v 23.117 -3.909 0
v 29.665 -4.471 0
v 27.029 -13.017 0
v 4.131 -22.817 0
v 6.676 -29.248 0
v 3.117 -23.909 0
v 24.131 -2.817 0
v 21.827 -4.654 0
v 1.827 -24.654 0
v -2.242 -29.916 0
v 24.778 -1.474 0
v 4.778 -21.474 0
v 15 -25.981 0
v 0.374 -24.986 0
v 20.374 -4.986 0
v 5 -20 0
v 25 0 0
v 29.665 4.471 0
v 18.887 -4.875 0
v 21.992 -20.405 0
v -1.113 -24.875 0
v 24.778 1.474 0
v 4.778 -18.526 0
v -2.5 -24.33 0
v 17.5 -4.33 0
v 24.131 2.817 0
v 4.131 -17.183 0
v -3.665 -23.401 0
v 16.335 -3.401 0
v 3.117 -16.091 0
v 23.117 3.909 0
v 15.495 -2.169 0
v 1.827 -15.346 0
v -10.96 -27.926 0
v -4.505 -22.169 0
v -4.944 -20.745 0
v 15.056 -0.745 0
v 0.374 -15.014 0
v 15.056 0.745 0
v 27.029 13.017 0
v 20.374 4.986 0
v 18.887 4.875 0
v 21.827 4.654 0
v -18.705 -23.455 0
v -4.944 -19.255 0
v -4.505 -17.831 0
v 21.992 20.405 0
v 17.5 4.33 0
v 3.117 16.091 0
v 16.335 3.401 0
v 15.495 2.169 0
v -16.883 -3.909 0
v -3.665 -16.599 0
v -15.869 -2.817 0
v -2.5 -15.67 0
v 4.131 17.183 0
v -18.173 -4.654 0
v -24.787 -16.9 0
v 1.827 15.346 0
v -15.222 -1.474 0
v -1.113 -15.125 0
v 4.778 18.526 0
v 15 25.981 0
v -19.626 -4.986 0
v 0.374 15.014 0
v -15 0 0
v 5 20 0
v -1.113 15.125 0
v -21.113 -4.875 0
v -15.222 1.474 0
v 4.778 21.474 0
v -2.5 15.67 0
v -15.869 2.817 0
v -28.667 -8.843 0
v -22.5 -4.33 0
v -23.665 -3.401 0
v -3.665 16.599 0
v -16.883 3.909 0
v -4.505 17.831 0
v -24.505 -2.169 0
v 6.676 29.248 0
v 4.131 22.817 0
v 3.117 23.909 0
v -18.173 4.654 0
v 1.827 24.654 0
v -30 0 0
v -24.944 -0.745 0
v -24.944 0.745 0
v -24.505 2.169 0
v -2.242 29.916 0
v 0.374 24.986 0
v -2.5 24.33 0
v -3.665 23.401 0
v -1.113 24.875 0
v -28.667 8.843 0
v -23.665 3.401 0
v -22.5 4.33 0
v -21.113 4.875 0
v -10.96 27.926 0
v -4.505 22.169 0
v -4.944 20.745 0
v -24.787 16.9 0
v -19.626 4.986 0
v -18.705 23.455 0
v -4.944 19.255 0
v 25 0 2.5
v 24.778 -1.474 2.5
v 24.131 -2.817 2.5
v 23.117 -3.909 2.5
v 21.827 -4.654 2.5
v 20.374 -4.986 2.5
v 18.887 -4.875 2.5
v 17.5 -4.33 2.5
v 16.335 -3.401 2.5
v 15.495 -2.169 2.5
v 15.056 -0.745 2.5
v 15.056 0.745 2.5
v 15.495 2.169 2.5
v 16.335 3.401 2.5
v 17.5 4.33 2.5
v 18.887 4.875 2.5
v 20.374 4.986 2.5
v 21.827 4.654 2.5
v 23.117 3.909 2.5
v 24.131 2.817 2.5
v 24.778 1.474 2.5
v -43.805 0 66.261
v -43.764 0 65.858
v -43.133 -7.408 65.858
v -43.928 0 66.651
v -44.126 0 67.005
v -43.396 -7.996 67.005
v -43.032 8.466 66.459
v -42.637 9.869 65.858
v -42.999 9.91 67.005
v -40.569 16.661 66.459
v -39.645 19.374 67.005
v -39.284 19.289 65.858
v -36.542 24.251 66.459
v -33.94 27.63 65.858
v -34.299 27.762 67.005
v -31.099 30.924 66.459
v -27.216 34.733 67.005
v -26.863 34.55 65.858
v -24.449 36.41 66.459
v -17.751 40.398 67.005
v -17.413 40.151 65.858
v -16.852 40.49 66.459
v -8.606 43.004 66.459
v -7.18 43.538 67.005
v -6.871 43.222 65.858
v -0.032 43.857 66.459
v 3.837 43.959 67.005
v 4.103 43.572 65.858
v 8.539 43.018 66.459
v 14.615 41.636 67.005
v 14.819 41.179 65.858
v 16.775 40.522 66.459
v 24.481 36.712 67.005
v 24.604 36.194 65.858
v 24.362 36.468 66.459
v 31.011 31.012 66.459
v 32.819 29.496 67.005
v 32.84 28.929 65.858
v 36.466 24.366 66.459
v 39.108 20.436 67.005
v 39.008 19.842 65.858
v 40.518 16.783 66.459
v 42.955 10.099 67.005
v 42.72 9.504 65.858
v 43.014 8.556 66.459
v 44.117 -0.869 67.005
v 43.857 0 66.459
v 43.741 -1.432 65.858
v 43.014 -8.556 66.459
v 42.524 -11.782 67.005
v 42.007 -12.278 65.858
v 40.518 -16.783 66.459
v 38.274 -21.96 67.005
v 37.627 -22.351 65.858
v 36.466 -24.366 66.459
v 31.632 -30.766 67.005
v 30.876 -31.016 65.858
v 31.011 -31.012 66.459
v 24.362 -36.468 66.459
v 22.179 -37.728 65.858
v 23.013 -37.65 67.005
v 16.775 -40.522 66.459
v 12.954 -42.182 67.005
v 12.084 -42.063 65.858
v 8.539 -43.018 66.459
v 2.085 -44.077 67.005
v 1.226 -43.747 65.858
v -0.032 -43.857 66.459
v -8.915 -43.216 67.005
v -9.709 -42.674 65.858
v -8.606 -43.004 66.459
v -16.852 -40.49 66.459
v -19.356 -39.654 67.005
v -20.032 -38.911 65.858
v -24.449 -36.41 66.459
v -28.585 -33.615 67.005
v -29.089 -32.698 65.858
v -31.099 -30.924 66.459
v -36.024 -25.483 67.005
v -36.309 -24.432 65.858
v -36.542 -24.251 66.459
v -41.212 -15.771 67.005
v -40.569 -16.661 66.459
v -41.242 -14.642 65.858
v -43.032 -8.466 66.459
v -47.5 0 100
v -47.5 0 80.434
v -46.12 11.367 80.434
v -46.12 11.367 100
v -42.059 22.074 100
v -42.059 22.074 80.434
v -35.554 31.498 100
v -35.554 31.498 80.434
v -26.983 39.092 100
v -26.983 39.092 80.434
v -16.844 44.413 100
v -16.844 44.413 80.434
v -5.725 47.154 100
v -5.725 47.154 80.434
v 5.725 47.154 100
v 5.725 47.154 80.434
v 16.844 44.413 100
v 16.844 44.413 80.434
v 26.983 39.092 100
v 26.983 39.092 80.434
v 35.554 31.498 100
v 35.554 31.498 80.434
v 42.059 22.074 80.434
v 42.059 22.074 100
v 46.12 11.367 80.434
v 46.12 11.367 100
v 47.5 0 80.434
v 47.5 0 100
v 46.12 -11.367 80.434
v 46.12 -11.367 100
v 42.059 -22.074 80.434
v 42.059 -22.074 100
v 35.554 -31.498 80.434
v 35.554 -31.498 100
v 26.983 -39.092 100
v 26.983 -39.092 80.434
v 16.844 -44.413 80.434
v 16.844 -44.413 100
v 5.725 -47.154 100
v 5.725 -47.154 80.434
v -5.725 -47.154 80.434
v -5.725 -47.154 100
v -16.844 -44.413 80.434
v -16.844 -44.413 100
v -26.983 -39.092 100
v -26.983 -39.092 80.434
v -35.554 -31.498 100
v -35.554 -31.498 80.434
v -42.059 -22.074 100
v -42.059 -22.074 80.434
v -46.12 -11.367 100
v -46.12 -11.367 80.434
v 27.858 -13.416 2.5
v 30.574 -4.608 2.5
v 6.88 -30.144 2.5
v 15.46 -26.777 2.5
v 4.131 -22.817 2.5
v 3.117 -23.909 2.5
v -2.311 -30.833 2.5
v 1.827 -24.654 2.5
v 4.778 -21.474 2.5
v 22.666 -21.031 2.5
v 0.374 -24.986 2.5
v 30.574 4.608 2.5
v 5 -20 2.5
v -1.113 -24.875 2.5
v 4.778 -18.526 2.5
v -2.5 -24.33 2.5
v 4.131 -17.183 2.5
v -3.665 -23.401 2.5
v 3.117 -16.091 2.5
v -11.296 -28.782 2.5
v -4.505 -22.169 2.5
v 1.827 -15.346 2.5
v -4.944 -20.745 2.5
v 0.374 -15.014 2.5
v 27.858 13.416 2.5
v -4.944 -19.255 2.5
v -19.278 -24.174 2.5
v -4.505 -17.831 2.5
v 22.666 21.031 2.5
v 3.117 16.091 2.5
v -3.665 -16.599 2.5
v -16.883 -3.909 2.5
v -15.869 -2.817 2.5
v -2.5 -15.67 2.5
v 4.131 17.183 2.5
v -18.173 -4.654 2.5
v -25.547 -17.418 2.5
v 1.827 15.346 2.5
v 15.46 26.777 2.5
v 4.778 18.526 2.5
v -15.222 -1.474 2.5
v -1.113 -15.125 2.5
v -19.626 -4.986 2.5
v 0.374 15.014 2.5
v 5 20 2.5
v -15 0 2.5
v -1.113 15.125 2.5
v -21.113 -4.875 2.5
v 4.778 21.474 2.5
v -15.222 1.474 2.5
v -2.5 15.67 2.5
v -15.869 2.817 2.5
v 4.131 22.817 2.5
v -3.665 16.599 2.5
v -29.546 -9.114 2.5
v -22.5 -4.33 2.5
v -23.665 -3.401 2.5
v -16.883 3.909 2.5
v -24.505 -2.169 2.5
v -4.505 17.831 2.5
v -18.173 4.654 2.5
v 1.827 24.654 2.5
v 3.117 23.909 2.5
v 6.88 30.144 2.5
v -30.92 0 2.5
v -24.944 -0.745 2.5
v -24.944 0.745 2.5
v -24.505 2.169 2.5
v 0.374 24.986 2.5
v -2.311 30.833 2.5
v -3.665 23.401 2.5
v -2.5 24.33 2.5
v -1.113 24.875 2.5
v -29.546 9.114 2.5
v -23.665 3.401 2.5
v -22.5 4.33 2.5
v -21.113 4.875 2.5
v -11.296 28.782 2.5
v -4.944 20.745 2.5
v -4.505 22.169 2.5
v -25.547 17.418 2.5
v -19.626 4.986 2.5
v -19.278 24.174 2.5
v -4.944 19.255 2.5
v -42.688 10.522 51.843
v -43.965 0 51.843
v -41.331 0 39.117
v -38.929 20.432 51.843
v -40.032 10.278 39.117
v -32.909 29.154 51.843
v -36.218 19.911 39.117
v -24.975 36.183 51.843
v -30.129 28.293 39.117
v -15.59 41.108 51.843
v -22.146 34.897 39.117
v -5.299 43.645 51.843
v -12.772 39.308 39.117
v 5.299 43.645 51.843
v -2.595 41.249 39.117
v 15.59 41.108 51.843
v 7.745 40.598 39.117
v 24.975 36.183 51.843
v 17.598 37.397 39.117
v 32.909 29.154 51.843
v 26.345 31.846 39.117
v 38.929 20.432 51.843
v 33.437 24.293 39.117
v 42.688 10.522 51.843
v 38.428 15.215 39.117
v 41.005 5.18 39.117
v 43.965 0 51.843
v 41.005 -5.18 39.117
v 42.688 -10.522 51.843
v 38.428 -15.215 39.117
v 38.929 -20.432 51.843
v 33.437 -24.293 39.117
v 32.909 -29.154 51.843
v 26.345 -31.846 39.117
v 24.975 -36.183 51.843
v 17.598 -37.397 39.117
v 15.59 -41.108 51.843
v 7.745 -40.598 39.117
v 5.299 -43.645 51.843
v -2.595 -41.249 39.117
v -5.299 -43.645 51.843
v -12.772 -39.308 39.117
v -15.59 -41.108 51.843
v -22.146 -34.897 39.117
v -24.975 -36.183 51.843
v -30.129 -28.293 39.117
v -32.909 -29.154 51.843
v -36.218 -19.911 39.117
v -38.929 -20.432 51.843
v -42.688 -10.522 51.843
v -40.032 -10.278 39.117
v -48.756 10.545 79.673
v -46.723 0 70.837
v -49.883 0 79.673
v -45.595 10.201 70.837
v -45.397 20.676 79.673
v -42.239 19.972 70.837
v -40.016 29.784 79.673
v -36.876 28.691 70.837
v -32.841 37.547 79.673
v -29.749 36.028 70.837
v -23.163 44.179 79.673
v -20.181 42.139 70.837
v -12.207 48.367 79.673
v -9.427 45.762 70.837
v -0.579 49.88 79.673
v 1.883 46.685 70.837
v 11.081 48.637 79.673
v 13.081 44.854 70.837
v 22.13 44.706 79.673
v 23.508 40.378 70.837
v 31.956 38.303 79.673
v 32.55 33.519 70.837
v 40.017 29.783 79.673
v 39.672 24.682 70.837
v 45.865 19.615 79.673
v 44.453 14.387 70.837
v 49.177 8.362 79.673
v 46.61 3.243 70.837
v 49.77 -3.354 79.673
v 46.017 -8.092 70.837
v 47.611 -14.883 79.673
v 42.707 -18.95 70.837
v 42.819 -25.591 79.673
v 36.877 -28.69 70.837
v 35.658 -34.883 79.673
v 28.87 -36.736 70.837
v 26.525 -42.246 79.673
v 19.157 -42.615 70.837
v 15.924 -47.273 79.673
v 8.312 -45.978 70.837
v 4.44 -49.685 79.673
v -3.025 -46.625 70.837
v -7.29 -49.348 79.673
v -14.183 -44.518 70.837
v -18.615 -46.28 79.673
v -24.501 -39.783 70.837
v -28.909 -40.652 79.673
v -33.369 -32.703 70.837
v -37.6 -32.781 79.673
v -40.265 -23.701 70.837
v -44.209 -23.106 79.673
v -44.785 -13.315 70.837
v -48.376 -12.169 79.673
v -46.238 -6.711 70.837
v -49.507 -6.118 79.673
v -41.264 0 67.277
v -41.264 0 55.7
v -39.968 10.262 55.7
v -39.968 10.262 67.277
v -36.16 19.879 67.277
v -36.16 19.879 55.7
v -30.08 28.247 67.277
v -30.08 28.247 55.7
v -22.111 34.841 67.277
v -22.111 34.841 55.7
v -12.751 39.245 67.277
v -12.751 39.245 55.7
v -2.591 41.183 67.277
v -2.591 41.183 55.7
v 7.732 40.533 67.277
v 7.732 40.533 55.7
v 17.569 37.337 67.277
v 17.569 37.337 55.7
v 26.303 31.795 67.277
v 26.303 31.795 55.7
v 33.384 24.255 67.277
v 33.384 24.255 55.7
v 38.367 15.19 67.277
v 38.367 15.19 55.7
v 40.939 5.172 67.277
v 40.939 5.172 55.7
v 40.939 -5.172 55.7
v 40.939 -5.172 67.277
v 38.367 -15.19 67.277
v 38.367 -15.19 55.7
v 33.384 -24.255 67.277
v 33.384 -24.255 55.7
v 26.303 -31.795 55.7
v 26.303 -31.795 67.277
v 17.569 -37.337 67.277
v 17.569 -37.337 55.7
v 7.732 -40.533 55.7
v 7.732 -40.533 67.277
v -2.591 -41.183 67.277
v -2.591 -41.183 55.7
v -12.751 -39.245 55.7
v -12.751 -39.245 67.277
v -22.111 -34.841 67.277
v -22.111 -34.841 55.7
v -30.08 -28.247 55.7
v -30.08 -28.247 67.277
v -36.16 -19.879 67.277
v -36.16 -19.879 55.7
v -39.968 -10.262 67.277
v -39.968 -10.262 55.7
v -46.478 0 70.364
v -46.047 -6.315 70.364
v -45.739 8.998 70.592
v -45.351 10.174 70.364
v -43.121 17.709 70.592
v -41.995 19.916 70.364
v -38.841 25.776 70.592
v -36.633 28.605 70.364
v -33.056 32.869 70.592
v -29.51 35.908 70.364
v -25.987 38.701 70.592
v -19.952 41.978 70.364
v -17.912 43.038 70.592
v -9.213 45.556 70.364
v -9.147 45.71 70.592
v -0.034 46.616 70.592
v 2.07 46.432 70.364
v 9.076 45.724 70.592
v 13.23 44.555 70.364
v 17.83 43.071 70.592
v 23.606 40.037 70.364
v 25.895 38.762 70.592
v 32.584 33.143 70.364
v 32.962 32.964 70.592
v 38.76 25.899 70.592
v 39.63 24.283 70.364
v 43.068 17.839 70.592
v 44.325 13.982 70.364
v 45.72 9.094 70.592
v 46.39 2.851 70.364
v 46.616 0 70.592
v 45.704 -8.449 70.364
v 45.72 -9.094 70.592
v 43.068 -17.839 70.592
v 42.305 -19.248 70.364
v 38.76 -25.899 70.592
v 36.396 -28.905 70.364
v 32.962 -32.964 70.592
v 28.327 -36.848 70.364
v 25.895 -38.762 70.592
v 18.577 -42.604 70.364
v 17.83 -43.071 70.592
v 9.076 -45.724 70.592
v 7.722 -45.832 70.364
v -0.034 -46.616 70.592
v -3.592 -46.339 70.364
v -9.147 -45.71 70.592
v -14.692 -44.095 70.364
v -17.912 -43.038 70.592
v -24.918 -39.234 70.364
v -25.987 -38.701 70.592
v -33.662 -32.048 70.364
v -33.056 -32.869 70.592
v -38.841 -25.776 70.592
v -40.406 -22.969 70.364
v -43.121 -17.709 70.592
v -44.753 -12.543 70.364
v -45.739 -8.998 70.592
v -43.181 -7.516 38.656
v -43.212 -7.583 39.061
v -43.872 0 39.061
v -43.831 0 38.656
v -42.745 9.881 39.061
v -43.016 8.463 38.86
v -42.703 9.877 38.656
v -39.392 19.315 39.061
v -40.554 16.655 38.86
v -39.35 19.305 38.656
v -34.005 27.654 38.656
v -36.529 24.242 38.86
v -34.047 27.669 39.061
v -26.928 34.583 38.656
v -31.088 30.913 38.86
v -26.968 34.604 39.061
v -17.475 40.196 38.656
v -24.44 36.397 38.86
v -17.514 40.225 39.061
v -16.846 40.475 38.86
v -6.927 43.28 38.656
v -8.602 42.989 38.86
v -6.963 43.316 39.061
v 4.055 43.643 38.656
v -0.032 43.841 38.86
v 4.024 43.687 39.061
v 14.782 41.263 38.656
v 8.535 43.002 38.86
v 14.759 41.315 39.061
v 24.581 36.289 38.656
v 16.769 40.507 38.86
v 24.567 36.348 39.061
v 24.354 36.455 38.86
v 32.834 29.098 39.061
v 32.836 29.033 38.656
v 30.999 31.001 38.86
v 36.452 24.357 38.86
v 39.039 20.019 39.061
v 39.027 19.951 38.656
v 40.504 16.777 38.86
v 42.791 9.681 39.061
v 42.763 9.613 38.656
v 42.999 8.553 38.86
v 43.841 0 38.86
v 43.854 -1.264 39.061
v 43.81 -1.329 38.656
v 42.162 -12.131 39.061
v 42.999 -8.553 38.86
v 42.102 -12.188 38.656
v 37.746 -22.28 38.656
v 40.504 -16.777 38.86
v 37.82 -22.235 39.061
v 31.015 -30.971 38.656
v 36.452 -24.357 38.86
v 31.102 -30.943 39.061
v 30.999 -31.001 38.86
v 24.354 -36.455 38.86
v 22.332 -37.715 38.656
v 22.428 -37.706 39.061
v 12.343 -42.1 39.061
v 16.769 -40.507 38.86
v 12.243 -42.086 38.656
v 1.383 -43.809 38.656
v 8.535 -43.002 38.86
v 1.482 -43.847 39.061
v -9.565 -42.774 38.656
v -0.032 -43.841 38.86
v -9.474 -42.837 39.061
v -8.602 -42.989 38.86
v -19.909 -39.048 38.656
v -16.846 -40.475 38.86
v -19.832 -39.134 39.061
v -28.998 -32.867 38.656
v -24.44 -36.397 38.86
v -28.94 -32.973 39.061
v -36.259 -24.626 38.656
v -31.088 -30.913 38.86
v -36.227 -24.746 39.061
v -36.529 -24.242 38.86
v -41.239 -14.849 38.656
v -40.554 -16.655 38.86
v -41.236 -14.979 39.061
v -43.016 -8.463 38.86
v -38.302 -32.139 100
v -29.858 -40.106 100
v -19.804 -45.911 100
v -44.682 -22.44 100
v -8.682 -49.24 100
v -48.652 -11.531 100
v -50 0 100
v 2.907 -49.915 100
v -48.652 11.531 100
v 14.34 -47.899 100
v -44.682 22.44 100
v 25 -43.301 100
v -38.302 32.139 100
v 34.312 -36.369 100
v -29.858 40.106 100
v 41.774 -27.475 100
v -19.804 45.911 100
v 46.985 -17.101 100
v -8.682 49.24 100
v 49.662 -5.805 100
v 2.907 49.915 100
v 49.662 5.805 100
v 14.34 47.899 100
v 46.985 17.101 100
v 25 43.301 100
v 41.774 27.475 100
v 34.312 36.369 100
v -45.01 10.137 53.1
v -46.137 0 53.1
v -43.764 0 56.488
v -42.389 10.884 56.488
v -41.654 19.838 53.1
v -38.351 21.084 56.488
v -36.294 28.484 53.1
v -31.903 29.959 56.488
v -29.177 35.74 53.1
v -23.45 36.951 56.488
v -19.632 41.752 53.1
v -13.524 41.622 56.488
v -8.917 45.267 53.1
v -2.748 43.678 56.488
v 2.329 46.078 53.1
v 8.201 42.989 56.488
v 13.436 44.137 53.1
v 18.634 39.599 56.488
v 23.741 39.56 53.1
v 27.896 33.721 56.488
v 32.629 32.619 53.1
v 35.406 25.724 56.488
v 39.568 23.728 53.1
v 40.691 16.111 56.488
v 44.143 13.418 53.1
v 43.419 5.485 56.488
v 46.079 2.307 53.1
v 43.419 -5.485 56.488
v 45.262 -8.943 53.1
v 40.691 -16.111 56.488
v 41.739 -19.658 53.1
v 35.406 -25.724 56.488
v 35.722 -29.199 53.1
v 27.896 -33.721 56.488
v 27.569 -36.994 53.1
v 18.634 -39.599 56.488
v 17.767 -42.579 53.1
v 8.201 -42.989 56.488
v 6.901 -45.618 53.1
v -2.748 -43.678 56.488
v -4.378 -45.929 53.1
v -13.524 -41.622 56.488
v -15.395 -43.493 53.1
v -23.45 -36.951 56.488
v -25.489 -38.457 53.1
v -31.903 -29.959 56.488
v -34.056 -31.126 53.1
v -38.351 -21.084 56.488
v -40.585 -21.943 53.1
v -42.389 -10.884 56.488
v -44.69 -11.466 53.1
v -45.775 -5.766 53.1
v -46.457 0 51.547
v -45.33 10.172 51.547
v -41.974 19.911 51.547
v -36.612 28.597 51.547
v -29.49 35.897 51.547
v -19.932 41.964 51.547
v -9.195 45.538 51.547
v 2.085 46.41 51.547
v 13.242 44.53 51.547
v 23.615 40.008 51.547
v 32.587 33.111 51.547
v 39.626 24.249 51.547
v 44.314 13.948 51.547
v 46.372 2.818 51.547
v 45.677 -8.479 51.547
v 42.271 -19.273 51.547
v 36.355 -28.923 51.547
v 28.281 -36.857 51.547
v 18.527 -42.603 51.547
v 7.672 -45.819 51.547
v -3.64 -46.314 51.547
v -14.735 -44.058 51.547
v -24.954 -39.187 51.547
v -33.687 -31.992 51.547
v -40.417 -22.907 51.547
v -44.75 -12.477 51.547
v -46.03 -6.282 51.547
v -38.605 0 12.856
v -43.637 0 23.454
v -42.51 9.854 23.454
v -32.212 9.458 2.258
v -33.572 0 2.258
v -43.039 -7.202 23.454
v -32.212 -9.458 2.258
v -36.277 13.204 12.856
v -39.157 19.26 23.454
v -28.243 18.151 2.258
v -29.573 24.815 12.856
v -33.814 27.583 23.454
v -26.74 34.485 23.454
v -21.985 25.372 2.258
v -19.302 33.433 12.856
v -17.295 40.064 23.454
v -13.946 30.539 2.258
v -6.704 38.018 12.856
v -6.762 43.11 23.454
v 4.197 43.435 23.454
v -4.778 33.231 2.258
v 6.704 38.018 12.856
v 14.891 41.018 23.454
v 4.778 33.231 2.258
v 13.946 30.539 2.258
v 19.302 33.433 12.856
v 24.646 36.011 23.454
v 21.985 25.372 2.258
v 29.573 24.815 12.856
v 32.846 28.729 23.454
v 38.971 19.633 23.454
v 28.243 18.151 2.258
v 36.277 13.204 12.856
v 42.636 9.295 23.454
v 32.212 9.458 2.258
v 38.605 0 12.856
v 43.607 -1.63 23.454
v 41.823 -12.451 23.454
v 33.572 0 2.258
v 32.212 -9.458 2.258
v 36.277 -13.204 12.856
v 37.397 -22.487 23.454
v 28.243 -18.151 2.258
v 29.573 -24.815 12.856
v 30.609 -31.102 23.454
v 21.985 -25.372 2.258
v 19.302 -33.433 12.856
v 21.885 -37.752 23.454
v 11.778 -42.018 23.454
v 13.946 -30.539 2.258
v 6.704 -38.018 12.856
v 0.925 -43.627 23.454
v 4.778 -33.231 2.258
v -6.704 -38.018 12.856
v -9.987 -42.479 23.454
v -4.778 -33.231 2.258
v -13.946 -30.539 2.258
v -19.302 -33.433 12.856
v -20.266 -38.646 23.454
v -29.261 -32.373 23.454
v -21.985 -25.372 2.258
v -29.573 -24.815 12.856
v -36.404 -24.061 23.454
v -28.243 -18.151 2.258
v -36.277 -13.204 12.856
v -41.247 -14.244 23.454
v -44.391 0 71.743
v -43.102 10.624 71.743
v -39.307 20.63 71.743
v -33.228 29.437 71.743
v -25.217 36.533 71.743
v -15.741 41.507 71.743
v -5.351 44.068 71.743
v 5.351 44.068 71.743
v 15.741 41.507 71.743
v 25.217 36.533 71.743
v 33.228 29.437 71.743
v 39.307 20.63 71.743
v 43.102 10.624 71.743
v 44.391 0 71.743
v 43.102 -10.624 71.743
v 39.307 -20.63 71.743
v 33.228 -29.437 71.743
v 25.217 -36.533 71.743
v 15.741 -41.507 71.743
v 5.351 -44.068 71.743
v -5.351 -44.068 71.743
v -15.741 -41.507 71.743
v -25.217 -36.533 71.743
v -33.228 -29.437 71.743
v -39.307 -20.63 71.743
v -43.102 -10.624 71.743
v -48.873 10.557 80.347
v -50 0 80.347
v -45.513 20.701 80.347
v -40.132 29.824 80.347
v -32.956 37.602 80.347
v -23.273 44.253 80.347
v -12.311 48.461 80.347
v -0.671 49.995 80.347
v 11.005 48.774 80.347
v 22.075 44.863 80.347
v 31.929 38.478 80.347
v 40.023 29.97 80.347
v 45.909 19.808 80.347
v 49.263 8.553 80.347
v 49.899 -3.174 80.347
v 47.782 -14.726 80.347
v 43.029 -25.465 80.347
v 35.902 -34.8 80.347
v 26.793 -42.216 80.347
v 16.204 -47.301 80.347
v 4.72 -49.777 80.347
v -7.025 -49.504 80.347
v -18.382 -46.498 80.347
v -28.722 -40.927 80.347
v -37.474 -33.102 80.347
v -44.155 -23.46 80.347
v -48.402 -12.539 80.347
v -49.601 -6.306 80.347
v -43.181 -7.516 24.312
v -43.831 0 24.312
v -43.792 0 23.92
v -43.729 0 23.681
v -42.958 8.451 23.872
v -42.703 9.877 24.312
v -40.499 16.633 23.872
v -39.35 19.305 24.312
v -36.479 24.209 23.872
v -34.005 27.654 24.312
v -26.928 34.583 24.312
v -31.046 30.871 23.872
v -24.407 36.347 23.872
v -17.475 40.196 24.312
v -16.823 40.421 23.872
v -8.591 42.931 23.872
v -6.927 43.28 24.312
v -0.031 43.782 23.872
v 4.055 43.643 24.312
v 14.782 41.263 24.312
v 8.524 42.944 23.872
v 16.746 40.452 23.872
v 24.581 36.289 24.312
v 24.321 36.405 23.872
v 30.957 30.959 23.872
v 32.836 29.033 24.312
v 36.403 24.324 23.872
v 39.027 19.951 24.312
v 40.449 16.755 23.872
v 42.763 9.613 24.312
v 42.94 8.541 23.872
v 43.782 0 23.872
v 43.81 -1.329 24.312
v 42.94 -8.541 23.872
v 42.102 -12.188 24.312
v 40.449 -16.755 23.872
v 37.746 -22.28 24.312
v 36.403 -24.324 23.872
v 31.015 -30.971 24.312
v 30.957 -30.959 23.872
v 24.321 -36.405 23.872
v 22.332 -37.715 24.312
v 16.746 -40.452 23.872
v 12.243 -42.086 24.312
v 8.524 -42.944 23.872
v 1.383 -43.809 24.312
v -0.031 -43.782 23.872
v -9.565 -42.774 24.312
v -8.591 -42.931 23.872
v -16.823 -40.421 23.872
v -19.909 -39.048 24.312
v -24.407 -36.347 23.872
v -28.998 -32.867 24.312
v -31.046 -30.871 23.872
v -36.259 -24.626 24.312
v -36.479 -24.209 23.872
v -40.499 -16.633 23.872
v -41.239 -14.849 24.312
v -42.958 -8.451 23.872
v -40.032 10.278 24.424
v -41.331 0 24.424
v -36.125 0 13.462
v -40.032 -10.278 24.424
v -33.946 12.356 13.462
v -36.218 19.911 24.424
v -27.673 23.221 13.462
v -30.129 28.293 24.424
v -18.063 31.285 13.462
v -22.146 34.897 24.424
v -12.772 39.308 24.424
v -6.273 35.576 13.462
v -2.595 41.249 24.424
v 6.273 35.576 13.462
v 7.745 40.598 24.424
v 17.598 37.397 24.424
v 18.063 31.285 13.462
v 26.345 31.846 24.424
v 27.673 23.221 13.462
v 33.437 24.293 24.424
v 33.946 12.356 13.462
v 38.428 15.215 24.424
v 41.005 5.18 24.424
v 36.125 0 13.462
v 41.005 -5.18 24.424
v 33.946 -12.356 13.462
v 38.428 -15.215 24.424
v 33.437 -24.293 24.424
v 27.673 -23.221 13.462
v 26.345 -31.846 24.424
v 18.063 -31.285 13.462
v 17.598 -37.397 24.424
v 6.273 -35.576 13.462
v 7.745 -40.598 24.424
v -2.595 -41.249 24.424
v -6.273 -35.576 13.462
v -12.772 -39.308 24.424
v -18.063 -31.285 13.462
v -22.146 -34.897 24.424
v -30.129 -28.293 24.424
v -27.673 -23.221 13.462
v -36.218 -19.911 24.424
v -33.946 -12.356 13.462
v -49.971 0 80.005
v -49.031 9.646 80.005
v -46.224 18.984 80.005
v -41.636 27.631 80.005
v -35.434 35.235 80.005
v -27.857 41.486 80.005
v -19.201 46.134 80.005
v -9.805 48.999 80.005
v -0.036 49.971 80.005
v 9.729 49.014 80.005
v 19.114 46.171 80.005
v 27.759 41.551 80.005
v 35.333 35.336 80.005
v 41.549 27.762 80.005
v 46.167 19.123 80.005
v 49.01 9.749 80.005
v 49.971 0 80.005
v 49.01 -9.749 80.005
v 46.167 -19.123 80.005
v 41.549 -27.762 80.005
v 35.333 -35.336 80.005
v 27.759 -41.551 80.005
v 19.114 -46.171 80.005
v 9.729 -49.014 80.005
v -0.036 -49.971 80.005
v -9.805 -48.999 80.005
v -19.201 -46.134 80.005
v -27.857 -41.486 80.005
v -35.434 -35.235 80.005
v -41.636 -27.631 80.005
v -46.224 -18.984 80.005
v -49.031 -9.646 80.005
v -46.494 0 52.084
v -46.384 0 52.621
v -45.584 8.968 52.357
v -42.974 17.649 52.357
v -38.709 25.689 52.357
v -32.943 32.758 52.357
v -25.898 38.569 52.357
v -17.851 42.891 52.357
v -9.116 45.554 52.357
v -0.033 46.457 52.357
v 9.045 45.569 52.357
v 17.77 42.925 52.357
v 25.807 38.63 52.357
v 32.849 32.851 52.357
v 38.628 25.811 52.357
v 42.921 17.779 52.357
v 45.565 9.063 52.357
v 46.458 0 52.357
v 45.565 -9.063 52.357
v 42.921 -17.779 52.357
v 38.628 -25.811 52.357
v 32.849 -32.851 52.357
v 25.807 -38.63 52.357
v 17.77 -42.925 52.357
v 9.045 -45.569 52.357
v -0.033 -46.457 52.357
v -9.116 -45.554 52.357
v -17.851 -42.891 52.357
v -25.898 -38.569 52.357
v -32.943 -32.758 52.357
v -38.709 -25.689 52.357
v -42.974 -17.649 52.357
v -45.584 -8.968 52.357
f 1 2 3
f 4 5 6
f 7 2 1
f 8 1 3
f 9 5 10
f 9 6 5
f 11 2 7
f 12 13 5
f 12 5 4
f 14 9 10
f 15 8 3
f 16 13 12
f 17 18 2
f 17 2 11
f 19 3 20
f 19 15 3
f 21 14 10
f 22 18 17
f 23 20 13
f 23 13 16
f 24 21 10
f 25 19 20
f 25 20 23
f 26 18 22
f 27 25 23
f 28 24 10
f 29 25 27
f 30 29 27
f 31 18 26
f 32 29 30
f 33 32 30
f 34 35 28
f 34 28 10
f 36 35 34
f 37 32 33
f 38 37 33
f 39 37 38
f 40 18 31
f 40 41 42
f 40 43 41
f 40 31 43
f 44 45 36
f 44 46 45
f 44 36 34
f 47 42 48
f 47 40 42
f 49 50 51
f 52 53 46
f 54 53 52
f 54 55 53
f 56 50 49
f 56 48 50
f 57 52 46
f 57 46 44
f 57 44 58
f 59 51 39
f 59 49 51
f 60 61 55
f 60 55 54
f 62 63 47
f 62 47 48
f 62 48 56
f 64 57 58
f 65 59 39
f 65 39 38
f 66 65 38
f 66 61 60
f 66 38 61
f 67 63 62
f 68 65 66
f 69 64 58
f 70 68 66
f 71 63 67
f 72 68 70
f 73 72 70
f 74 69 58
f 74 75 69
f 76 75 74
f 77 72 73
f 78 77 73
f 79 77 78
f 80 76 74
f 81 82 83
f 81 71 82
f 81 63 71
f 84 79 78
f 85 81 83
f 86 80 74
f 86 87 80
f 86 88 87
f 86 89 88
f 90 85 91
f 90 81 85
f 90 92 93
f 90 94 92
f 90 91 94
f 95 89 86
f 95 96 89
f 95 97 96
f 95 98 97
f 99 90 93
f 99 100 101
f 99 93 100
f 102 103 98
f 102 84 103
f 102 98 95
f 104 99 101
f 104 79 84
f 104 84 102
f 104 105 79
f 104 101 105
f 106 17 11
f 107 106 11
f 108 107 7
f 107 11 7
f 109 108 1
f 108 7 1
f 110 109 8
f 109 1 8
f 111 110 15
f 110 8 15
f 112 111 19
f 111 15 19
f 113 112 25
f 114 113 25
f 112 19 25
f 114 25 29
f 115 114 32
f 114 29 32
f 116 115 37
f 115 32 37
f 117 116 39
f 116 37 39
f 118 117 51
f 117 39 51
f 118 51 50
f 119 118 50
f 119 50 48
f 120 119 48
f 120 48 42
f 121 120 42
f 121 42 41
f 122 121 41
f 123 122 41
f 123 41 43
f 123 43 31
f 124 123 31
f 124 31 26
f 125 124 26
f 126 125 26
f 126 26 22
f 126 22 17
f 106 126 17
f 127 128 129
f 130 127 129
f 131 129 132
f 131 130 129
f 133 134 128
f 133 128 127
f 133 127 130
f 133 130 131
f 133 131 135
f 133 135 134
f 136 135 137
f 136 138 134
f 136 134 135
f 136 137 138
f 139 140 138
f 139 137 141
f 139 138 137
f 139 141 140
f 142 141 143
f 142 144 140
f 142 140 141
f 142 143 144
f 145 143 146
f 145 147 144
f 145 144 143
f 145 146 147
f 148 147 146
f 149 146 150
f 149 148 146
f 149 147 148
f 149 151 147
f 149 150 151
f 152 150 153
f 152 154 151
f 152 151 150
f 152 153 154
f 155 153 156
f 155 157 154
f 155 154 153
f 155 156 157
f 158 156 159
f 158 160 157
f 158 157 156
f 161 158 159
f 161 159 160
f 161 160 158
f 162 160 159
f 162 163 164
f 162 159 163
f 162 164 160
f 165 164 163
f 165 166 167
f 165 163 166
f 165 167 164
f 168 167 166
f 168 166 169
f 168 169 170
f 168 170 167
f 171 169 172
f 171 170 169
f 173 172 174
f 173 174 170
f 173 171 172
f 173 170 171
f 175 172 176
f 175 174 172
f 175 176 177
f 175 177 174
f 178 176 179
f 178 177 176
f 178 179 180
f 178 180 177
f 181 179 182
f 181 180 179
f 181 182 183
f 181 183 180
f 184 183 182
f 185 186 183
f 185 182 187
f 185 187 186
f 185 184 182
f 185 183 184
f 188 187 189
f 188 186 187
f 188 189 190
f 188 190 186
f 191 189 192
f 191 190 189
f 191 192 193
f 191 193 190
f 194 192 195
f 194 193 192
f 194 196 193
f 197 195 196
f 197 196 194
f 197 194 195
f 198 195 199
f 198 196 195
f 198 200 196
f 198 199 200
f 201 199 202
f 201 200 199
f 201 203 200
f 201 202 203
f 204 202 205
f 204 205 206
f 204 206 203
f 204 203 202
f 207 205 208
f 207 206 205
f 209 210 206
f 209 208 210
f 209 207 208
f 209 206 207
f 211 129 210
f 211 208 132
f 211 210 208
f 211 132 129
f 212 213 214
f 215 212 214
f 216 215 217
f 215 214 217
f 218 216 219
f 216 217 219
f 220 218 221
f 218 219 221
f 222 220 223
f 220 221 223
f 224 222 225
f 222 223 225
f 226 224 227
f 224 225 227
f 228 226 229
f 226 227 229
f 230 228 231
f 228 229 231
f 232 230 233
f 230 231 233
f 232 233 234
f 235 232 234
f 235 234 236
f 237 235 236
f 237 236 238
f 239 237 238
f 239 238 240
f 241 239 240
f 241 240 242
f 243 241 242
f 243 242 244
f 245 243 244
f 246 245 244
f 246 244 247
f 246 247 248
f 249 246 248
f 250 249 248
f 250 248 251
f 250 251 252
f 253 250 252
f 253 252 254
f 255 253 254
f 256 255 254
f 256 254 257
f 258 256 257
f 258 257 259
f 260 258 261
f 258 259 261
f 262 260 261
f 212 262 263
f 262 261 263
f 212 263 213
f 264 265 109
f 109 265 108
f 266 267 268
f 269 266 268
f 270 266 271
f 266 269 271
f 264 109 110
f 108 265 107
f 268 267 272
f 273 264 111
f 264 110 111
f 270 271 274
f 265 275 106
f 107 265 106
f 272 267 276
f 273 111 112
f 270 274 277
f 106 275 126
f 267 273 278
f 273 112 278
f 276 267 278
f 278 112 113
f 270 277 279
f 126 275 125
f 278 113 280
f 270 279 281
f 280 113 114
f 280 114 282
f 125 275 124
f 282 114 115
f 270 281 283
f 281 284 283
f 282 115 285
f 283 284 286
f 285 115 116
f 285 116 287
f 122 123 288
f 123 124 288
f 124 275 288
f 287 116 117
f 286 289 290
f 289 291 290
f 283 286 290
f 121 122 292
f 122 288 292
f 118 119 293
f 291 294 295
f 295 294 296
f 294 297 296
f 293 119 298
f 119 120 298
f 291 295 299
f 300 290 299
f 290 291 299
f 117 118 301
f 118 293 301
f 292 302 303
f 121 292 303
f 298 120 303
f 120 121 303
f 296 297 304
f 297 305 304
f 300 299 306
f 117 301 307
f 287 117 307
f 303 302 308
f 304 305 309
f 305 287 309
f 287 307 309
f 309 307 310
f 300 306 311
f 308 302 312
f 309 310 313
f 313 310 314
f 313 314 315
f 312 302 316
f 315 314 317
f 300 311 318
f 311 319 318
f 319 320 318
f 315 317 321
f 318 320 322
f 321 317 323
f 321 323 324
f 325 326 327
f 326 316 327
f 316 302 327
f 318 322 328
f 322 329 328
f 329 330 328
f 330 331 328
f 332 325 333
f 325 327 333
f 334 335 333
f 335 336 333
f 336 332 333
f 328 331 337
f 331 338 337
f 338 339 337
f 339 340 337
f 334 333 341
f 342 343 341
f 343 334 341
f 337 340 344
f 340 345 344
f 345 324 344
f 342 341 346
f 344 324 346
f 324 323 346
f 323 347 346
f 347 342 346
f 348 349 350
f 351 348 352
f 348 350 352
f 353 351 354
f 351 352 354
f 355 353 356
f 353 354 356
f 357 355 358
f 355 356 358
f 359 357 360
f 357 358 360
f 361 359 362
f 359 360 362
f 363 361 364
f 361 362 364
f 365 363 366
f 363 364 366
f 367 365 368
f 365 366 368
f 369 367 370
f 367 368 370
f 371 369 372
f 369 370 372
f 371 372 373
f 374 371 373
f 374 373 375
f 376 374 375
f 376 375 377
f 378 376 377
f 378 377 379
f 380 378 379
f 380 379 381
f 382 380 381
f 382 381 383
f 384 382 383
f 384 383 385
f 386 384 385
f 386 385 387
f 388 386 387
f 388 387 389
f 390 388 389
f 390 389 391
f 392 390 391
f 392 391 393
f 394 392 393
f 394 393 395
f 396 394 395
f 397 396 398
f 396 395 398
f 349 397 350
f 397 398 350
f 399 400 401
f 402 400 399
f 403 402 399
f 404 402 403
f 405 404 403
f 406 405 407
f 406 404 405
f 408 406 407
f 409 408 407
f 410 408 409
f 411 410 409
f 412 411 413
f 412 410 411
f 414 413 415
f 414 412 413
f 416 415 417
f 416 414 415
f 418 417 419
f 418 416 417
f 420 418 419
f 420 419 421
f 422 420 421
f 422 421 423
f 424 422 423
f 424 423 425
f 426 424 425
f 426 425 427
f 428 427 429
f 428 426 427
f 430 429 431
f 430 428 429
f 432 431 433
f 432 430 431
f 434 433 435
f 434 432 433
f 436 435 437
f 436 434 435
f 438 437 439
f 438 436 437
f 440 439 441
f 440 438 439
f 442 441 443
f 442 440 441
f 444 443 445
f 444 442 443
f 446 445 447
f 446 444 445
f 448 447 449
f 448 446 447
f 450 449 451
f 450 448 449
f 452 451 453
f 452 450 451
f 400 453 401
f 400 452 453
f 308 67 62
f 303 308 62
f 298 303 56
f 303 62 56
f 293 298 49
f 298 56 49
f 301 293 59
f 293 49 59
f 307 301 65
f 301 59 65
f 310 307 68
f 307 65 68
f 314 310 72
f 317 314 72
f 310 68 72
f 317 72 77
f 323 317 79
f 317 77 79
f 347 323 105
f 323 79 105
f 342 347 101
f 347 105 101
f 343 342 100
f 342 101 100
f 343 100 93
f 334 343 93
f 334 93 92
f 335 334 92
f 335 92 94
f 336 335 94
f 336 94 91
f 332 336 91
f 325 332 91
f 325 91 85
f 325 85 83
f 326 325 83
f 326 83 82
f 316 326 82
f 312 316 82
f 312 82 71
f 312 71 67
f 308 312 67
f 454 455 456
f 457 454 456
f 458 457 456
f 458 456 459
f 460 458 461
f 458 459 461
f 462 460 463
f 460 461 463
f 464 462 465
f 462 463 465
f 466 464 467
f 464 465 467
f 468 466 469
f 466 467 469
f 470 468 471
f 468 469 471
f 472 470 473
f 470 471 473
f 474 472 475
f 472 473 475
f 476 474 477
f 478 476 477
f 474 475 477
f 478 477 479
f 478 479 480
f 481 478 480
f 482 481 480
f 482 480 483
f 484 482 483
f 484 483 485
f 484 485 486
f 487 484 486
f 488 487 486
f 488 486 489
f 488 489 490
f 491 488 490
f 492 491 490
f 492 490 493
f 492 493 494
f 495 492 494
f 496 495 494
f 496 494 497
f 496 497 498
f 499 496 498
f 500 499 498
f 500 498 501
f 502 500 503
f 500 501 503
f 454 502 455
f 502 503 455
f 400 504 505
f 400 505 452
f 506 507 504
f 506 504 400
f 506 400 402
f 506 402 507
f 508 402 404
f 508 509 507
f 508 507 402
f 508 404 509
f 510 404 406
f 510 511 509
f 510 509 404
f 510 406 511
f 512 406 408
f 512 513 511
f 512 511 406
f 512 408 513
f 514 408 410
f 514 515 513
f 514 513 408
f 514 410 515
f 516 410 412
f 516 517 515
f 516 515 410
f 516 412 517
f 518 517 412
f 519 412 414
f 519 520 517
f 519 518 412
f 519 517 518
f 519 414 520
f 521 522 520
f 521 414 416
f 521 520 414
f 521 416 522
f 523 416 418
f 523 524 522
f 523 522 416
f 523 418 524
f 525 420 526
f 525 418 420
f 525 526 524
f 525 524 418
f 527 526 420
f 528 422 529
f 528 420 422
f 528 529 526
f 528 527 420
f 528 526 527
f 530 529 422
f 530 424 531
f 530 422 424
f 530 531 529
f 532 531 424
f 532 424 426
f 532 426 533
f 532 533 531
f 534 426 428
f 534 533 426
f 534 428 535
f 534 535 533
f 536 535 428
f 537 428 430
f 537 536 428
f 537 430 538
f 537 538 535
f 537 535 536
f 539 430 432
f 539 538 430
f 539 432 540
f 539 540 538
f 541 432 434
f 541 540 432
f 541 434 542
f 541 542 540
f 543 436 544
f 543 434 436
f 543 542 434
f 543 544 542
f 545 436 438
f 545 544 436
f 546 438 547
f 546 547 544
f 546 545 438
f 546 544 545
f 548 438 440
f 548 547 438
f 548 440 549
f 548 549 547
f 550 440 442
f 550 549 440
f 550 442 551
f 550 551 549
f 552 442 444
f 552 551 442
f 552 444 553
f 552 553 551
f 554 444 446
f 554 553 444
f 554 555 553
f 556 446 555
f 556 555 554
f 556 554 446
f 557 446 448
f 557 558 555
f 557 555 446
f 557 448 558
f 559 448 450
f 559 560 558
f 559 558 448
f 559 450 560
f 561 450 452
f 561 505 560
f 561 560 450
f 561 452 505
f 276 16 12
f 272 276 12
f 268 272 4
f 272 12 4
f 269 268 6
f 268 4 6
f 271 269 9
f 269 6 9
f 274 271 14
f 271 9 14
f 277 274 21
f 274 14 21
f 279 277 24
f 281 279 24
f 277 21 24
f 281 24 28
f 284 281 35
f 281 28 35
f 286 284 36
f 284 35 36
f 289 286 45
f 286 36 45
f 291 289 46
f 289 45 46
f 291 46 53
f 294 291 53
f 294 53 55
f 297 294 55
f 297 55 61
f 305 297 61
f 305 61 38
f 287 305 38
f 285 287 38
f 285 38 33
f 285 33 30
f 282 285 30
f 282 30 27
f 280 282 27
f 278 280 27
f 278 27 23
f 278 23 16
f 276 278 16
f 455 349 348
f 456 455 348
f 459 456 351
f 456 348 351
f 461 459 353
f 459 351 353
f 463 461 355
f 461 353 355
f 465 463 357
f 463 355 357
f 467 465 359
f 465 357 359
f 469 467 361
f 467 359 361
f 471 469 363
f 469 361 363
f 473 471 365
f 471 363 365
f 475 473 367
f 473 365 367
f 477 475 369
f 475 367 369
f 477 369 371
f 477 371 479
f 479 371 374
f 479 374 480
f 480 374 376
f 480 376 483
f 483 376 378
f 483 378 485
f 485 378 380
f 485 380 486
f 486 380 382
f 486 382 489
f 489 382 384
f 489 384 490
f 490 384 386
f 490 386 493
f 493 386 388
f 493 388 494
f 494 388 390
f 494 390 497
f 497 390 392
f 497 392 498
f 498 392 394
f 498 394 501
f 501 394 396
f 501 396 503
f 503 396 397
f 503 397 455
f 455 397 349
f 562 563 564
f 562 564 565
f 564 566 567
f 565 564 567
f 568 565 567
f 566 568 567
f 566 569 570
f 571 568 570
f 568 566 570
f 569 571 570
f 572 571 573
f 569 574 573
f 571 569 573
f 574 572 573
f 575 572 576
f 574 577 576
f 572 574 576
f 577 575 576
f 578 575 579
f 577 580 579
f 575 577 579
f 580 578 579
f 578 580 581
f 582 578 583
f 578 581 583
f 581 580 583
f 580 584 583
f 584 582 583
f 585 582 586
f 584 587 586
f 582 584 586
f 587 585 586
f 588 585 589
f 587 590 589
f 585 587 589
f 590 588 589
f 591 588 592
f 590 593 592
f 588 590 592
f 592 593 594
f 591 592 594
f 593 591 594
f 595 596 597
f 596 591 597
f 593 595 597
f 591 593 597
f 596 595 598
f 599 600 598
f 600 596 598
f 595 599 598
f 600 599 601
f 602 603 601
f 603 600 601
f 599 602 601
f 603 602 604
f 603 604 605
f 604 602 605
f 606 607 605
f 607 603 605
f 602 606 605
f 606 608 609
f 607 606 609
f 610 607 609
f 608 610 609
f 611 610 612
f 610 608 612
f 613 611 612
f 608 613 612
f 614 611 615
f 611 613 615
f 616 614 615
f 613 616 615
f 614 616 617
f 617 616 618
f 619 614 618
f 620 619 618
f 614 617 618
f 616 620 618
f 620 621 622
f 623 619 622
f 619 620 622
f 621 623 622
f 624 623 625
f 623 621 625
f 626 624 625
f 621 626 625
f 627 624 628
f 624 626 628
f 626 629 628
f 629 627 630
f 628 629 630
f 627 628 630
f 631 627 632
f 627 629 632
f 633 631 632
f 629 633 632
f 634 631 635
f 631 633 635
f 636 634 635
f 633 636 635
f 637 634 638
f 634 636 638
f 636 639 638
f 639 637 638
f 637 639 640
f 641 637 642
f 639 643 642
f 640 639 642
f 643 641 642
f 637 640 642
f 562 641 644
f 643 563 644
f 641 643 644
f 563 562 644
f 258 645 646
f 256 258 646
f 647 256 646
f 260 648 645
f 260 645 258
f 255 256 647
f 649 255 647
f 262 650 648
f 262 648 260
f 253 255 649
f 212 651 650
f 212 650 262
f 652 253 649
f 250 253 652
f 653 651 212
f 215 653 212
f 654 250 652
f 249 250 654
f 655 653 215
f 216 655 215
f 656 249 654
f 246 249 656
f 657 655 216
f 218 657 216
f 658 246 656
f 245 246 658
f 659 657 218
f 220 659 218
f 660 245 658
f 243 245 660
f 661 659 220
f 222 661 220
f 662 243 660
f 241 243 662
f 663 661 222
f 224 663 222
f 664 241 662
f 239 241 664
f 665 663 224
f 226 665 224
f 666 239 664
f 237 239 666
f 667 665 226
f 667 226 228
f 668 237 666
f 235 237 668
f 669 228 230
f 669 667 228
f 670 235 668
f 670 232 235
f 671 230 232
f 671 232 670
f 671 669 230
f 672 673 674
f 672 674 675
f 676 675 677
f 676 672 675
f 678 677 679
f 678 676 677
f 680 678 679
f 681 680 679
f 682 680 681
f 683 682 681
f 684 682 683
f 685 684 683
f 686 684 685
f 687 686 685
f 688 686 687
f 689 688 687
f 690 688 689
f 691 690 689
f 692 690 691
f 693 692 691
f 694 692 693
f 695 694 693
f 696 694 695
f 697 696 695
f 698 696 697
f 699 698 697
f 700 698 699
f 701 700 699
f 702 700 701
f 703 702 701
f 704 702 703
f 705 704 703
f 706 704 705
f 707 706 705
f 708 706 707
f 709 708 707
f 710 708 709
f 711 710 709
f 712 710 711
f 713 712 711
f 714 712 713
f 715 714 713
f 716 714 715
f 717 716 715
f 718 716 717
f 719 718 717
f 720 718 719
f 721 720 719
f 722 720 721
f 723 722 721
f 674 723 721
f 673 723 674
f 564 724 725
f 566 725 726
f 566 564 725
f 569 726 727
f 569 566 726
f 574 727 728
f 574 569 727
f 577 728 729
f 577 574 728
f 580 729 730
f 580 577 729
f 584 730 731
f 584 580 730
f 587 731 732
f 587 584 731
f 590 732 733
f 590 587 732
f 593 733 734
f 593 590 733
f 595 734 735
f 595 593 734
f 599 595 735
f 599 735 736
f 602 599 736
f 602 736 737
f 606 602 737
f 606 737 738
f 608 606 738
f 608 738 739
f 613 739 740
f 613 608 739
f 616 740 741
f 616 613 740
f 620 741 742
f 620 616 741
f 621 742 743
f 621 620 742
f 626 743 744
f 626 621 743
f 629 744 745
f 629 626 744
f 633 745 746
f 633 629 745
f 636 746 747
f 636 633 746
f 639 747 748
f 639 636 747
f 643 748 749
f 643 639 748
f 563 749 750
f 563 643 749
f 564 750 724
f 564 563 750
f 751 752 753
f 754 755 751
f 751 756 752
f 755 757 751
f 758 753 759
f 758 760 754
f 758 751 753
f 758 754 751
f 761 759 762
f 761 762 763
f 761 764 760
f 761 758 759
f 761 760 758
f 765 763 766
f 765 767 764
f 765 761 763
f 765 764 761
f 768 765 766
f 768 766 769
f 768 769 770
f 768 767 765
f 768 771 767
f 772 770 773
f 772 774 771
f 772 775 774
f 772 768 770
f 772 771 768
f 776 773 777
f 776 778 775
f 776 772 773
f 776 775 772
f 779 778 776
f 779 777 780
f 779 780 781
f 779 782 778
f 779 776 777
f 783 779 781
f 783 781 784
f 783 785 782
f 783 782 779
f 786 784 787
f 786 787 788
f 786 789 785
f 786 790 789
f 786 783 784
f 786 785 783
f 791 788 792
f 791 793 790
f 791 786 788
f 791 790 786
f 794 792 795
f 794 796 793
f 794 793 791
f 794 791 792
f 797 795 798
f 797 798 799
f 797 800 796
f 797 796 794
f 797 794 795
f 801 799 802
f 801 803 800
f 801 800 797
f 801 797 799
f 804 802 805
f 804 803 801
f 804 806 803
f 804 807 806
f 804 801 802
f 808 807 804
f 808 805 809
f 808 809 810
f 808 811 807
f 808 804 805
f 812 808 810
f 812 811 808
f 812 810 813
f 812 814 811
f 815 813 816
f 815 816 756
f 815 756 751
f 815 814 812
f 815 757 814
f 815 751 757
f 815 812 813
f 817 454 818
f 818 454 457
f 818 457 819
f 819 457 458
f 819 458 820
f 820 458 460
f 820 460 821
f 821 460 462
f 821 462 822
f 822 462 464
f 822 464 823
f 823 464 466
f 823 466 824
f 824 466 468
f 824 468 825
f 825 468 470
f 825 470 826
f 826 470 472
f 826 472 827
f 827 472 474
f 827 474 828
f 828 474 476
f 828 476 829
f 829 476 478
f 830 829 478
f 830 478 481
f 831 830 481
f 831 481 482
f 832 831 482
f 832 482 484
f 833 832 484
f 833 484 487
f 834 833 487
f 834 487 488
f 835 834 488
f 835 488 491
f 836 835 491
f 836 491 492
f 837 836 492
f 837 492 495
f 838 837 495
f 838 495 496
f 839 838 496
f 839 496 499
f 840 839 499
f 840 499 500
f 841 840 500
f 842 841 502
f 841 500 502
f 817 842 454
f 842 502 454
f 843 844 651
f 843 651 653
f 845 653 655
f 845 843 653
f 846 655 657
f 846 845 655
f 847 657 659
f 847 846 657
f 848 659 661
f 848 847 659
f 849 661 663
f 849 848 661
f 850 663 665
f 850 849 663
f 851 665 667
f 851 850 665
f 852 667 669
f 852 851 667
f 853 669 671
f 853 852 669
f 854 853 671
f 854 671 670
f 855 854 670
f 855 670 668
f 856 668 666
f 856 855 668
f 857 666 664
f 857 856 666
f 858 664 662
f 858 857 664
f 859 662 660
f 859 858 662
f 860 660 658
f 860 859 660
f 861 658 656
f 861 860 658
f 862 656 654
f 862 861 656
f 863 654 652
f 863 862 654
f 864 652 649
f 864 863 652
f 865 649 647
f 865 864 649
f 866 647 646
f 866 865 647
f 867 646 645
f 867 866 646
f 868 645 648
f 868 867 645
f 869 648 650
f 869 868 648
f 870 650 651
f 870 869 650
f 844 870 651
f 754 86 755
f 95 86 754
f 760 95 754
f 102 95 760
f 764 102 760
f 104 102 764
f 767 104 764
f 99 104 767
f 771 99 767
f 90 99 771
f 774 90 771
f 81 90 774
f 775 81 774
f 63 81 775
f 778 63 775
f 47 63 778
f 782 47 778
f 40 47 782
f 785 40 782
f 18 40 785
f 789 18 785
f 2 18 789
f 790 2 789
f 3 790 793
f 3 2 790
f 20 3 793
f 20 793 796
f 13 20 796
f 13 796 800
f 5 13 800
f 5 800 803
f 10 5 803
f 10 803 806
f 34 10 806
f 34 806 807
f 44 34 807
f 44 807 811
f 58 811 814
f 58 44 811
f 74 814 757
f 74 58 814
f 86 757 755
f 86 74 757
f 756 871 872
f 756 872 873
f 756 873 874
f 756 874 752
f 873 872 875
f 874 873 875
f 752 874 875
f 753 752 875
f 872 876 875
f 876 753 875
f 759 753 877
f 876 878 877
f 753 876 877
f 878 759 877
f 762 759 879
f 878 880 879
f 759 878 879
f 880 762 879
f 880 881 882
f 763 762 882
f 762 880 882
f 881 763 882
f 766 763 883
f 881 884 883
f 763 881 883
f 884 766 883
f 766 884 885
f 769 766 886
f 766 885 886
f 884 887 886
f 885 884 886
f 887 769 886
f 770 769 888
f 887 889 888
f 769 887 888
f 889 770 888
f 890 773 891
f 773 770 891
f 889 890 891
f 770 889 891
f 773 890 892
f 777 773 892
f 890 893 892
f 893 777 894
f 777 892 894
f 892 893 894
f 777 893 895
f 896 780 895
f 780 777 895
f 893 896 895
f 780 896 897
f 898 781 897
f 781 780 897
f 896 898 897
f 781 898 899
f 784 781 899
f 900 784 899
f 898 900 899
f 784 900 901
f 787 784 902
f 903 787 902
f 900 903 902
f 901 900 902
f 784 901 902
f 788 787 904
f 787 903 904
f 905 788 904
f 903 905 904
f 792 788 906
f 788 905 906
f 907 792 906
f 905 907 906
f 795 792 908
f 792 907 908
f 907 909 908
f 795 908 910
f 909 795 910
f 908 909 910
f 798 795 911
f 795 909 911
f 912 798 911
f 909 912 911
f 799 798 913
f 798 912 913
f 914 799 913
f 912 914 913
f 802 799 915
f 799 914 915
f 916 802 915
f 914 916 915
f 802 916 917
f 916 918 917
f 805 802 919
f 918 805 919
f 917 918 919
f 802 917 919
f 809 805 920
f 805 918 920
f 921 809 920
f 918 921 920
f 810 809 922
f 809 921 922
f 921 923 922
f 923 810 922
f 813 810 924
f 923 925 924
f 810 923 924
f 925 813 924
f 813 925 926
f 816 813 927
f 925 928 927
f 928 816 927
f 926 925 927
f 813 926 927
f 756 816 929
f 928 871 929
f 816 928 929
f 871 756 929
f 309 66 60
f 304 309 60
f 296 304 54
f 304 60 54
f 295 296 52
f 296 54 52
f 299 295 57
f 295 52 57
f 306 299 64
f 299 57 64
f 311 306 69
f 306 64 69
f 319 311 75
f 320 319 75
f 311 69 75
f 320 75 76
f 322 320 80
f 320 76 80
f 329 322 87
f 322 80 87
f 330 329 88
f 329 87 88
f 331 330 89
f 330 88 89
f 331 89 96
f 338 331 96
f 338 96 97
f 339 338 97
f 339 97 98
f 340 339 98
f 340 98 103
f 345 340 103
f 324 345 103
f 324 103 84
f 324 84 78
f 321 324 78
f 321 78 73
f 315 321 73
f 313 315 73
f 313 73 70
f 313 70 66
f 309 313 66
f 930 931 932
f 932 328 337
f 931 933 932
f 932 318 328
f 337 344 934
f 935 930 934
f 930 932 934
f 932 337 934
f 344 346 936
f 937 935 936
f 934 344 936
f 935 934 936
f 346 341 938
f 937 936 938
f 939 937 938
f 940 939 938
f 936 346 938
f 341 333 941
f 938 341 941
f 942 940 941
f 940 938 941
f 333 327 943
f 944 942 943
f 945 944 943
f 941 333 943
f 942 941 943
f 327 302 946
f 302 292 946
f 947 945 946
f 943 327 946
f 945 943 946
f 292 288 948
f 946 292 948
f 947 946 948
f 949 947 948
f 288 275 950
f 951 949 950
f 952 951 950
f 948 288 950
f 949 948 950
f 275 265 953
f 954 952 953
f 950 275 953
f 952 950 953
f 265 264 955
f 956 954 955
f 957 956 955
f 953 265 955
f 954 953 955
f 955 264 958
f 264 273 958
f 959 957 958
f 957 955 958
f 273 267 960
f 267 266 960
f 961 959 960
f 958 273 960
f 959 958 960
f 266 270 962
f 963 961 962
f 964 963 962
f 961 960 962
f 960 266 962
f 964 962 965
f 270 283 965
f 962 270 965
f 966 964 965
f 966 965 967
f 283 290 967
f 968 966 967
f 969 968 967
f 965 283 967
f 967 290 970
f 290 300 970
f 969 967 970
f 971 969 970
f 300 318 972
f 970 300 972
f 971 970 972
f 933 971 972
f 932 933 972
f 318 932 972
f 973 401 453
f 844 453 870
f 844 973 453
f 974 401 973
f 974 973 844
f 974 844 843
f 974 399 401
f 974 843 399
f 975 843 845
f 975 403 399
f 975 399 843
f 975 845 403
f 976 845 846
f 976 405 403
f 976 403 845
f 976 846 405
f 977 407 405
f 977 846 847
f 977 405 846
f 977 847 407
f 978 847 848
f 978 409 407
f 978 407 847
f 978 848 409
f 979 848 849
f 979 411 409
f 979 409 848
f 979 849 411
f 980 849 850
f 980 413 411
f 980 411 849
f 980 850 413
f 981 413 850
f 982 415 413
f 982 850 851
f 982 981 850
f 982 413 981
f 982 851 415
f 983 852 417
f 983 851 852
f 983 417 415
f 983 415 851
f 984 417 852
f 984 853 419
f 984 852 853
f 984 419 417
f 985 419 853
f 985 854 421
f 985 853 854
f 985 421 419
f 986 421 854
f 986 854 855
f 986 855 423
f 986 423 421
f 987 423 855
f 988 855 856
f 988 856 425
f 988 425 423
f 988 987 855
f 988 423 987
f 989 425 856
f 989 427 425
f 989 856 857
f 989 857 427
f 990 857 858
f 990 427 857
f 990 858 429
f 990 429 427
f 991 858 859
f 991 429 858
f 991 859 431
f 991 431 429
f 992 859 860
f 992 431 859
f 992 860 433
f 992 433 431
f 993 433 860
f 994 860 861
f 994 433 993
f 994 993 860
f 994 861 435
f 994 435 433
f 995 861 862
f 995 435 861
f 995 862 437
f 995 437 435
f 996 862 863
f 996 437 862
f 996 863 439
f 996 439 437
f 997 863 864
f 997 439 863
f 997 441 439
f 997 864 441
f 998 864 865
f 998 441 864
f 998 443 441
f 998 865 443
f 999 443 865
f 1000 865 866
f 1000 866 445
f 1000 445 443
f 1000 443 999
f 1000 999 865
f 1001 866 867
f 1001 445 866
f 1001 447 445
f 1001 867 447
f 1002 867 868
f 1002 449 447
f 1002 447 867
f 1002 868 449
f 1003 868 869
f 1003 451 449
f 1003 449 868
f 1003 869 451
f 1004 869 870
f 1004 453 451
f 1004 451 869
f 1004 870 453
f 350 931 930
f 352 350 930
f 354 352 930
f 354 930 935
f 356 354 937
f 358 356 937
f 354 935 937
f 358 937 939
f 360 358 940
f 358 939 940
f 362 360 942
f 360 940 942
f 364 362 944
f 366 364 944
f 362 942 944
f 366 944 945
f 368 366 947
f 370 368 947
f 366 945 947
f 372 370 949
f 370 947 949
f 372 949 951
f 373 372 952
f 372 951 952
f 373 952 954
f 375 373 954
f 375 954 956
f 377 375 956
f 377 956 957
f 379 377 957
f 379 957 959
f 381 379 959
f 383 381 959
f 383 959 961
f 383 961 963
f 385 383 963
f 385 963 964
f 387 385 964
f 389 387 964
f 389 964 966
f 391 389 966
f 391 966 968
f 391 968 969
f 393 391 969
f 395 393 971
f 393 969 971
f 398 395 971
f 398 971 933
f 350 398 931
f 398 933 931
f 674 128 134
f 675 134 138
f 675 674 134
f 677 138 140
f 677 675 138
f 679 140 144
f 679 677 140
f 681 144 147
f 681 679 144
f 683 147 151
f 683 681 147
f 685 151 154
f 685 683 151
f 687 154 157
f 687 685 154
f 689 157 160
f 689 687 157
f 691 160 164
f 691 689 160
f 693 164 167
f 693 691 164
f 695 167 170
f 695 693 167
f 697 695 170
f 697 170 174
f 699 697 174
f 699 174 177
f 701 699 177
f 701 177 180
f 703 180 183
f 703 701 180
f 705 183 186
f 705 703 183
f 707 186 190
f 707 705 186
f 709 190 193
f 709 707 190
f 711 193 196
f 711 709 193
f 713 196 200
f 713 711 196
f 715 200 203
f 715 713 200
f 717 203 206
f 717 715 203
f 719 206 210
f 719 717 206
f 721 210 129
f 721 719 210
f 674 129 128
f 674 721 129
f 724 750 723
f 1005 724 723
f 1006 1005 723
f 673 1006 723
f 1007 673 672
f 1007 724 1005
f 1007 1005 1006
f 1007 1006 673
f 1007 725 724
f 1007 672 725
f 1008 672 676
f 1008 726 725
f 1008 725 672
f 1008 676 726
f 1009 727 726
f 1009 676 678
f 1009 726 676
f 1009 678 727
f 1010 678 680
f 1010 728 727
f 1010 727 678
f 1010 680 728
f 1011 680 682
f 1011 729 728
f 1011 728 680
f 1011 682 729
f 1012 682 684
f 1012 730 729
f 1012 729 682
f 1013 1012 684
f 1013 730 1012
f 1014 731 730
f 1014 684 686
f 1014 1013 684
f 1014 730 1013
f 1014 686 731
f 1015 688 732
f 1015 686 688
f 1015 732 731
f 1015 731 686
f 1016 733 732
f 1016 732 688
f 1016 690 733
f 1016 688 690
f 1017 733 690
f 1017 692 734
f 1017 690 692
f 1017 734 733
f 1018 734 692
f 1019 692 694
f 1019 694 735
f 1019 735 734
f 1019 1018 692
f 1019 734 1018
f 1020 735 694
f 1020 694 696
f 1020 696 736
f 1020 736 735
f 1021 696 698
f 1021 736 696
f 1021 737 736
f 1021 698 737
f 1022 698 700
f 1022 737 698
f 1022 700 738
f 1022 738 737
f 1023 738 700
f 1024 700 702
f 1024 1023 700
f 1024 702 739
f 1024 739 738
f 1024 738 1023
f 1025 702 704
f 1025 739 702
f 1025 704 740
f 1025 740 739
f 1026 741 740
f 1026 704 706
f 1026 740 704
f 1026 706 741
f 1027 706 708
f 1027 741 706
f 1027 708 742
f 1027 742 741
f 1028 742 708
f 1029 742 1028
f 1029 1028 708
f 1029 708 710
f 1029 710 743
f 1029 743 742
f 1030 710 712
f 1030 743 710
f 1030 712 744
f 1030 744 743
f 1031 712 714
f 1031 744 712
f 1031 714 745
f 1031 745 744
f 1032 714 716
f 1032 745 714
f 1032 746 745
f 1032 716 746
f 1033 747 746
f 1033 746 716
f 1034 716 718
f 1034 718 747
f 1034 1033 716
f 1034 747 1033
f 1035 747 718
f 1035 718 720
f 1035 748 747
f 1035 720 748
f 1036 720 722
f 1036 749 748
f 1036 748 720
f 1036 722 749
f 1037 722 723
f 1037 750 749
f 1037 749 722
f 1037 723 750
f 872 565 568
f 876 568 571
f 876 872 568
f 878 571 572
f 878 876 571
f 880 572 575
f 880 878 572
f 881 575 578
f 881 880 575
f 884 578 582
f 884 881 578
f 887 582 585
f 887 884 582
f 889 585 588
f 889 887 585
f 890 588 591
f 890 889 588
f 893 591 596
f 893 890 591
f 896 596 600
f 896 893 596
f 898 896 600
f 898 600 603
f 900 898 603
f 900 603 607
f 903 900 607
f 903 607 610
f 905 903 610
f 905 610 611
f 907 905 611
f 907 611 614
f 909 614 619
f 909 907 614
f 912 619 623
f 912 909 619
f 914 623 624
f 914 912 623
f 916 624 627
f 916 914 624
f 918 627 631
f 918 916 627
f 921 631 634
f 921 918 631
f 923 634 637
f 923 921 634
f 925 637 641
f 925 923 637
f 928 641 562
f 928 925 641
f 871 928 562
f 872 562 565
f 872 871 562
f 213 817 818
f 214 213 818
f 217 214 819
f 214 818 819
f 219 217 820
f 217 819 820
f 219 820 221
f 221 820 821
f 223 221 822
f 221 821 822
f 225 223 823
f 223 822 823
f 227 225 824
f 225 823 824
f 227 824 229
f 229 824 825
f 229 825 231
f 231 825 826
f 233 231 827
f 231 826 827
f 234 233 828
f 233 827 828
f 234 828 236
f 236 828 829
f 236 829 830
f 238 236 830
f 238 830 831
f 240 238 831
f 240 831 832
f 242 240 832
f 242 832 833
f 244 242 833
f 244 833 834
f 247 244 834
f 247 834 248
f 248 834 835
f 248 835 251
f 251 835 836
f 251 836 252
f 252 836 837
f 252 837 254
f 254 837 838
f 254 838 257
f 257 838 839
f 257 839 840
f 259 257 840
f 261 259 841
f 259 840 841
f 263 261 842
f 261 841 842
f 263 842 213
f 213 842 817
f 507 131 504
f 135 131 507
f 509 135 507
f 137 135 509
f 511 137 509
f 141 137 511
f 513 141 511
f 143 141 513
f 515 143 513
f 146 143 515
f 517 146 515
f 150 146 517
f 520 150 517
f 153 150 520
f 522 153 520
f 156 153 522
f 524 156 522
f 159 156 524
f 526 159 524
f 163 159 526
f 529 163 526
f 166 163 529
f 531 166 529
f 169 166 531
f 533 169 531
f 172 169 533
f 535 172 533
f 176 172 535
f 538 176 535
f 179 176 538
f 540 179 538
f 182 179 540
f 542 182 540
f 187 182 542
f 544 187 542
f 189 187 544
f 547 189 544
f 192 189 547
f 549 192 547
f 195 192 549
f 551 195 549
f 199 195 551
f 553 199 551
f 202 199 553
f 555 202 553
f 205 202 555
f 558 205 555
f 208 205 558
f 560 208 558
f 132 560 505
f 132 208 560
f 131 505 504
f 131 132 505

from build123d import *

# Parameters (mm, degrees)
F2_T     = -2.5
F3_SIZE  = 2.5
F4_R     = 5
F5_DEPTH = 10
F6_R     = 2
F7_R     = 2


with BuildPart() as f1:
    # F0 (on Front) → F1 (revolve)
    with BuildSketch(Plane.XZ):
        Polygon((-50, 100), (-50, 80), (-46.6322180986, 70.5841598853), (-43.7643359169, 66.4883996639), (-43.7643359169, 56.4883996639), (-46.6322180986, 52.3926394425), (-43.8305661082, 38.8607935607), (-43.8305661082, 23.8607935607), (-32.5, 0), (0, 0), (0, 100), align=None)
    revolve(axis=Axis((0, 0, 50), (0, 0, -1)))

    # F2
    f2_openings = [f1.faces().sort_by_distance(p)[0] for p in [
        (0, 0, 100),
    ]]
    offset(amount=F2_T, openings=f2_openings, kind=Kind.INTERSECTION)

    # F3
    f3_edges = [f1.edges().sort_by_distance(p)[0] for p in [
        (32.5, 0, 0),
    ]]
    chamfer(f3_edges, length=F3_SIZE)

    # F4 (on face) → F5 (cut)
    with BuildSketch(Plane(origin=(0, 0, 0), x_dir=(1, 0, 0), z_dir=(0, 0, -1))):
        with Locations((-20, 0)):
            Circle(F4_R)
        with Locations((0, 20)):
            Circle(F4_R)
        with Locations((20, 0)):
            Circle(F4_R)
        with Locations((0, -20)):
            Circle(F4_R)
    extrude(amount=-F5_DEPTH, mode=Mode.SUBTRACT)

    # F6
    f6_edges = [f1.edges().sort_by_distance(p)[0] for p in [
        (46.632218, 0, 52.392639),
    ]]
    fillet(f6_edges, radius=F6_R)

    # F7
    f7_edges = [f1.edges().sort_by_distance(p)[0] for p in [
        (43.830566, 0, 23.860794),
        (50, 0, 80),
        (43.830566, 0, 38.860794),
        (43.764336, 0, 66.4884),
        (46.632218, 0, 70.58416),
    ]]
    fillet(f7_edges, radius=F7_R)


solid = f1.part
